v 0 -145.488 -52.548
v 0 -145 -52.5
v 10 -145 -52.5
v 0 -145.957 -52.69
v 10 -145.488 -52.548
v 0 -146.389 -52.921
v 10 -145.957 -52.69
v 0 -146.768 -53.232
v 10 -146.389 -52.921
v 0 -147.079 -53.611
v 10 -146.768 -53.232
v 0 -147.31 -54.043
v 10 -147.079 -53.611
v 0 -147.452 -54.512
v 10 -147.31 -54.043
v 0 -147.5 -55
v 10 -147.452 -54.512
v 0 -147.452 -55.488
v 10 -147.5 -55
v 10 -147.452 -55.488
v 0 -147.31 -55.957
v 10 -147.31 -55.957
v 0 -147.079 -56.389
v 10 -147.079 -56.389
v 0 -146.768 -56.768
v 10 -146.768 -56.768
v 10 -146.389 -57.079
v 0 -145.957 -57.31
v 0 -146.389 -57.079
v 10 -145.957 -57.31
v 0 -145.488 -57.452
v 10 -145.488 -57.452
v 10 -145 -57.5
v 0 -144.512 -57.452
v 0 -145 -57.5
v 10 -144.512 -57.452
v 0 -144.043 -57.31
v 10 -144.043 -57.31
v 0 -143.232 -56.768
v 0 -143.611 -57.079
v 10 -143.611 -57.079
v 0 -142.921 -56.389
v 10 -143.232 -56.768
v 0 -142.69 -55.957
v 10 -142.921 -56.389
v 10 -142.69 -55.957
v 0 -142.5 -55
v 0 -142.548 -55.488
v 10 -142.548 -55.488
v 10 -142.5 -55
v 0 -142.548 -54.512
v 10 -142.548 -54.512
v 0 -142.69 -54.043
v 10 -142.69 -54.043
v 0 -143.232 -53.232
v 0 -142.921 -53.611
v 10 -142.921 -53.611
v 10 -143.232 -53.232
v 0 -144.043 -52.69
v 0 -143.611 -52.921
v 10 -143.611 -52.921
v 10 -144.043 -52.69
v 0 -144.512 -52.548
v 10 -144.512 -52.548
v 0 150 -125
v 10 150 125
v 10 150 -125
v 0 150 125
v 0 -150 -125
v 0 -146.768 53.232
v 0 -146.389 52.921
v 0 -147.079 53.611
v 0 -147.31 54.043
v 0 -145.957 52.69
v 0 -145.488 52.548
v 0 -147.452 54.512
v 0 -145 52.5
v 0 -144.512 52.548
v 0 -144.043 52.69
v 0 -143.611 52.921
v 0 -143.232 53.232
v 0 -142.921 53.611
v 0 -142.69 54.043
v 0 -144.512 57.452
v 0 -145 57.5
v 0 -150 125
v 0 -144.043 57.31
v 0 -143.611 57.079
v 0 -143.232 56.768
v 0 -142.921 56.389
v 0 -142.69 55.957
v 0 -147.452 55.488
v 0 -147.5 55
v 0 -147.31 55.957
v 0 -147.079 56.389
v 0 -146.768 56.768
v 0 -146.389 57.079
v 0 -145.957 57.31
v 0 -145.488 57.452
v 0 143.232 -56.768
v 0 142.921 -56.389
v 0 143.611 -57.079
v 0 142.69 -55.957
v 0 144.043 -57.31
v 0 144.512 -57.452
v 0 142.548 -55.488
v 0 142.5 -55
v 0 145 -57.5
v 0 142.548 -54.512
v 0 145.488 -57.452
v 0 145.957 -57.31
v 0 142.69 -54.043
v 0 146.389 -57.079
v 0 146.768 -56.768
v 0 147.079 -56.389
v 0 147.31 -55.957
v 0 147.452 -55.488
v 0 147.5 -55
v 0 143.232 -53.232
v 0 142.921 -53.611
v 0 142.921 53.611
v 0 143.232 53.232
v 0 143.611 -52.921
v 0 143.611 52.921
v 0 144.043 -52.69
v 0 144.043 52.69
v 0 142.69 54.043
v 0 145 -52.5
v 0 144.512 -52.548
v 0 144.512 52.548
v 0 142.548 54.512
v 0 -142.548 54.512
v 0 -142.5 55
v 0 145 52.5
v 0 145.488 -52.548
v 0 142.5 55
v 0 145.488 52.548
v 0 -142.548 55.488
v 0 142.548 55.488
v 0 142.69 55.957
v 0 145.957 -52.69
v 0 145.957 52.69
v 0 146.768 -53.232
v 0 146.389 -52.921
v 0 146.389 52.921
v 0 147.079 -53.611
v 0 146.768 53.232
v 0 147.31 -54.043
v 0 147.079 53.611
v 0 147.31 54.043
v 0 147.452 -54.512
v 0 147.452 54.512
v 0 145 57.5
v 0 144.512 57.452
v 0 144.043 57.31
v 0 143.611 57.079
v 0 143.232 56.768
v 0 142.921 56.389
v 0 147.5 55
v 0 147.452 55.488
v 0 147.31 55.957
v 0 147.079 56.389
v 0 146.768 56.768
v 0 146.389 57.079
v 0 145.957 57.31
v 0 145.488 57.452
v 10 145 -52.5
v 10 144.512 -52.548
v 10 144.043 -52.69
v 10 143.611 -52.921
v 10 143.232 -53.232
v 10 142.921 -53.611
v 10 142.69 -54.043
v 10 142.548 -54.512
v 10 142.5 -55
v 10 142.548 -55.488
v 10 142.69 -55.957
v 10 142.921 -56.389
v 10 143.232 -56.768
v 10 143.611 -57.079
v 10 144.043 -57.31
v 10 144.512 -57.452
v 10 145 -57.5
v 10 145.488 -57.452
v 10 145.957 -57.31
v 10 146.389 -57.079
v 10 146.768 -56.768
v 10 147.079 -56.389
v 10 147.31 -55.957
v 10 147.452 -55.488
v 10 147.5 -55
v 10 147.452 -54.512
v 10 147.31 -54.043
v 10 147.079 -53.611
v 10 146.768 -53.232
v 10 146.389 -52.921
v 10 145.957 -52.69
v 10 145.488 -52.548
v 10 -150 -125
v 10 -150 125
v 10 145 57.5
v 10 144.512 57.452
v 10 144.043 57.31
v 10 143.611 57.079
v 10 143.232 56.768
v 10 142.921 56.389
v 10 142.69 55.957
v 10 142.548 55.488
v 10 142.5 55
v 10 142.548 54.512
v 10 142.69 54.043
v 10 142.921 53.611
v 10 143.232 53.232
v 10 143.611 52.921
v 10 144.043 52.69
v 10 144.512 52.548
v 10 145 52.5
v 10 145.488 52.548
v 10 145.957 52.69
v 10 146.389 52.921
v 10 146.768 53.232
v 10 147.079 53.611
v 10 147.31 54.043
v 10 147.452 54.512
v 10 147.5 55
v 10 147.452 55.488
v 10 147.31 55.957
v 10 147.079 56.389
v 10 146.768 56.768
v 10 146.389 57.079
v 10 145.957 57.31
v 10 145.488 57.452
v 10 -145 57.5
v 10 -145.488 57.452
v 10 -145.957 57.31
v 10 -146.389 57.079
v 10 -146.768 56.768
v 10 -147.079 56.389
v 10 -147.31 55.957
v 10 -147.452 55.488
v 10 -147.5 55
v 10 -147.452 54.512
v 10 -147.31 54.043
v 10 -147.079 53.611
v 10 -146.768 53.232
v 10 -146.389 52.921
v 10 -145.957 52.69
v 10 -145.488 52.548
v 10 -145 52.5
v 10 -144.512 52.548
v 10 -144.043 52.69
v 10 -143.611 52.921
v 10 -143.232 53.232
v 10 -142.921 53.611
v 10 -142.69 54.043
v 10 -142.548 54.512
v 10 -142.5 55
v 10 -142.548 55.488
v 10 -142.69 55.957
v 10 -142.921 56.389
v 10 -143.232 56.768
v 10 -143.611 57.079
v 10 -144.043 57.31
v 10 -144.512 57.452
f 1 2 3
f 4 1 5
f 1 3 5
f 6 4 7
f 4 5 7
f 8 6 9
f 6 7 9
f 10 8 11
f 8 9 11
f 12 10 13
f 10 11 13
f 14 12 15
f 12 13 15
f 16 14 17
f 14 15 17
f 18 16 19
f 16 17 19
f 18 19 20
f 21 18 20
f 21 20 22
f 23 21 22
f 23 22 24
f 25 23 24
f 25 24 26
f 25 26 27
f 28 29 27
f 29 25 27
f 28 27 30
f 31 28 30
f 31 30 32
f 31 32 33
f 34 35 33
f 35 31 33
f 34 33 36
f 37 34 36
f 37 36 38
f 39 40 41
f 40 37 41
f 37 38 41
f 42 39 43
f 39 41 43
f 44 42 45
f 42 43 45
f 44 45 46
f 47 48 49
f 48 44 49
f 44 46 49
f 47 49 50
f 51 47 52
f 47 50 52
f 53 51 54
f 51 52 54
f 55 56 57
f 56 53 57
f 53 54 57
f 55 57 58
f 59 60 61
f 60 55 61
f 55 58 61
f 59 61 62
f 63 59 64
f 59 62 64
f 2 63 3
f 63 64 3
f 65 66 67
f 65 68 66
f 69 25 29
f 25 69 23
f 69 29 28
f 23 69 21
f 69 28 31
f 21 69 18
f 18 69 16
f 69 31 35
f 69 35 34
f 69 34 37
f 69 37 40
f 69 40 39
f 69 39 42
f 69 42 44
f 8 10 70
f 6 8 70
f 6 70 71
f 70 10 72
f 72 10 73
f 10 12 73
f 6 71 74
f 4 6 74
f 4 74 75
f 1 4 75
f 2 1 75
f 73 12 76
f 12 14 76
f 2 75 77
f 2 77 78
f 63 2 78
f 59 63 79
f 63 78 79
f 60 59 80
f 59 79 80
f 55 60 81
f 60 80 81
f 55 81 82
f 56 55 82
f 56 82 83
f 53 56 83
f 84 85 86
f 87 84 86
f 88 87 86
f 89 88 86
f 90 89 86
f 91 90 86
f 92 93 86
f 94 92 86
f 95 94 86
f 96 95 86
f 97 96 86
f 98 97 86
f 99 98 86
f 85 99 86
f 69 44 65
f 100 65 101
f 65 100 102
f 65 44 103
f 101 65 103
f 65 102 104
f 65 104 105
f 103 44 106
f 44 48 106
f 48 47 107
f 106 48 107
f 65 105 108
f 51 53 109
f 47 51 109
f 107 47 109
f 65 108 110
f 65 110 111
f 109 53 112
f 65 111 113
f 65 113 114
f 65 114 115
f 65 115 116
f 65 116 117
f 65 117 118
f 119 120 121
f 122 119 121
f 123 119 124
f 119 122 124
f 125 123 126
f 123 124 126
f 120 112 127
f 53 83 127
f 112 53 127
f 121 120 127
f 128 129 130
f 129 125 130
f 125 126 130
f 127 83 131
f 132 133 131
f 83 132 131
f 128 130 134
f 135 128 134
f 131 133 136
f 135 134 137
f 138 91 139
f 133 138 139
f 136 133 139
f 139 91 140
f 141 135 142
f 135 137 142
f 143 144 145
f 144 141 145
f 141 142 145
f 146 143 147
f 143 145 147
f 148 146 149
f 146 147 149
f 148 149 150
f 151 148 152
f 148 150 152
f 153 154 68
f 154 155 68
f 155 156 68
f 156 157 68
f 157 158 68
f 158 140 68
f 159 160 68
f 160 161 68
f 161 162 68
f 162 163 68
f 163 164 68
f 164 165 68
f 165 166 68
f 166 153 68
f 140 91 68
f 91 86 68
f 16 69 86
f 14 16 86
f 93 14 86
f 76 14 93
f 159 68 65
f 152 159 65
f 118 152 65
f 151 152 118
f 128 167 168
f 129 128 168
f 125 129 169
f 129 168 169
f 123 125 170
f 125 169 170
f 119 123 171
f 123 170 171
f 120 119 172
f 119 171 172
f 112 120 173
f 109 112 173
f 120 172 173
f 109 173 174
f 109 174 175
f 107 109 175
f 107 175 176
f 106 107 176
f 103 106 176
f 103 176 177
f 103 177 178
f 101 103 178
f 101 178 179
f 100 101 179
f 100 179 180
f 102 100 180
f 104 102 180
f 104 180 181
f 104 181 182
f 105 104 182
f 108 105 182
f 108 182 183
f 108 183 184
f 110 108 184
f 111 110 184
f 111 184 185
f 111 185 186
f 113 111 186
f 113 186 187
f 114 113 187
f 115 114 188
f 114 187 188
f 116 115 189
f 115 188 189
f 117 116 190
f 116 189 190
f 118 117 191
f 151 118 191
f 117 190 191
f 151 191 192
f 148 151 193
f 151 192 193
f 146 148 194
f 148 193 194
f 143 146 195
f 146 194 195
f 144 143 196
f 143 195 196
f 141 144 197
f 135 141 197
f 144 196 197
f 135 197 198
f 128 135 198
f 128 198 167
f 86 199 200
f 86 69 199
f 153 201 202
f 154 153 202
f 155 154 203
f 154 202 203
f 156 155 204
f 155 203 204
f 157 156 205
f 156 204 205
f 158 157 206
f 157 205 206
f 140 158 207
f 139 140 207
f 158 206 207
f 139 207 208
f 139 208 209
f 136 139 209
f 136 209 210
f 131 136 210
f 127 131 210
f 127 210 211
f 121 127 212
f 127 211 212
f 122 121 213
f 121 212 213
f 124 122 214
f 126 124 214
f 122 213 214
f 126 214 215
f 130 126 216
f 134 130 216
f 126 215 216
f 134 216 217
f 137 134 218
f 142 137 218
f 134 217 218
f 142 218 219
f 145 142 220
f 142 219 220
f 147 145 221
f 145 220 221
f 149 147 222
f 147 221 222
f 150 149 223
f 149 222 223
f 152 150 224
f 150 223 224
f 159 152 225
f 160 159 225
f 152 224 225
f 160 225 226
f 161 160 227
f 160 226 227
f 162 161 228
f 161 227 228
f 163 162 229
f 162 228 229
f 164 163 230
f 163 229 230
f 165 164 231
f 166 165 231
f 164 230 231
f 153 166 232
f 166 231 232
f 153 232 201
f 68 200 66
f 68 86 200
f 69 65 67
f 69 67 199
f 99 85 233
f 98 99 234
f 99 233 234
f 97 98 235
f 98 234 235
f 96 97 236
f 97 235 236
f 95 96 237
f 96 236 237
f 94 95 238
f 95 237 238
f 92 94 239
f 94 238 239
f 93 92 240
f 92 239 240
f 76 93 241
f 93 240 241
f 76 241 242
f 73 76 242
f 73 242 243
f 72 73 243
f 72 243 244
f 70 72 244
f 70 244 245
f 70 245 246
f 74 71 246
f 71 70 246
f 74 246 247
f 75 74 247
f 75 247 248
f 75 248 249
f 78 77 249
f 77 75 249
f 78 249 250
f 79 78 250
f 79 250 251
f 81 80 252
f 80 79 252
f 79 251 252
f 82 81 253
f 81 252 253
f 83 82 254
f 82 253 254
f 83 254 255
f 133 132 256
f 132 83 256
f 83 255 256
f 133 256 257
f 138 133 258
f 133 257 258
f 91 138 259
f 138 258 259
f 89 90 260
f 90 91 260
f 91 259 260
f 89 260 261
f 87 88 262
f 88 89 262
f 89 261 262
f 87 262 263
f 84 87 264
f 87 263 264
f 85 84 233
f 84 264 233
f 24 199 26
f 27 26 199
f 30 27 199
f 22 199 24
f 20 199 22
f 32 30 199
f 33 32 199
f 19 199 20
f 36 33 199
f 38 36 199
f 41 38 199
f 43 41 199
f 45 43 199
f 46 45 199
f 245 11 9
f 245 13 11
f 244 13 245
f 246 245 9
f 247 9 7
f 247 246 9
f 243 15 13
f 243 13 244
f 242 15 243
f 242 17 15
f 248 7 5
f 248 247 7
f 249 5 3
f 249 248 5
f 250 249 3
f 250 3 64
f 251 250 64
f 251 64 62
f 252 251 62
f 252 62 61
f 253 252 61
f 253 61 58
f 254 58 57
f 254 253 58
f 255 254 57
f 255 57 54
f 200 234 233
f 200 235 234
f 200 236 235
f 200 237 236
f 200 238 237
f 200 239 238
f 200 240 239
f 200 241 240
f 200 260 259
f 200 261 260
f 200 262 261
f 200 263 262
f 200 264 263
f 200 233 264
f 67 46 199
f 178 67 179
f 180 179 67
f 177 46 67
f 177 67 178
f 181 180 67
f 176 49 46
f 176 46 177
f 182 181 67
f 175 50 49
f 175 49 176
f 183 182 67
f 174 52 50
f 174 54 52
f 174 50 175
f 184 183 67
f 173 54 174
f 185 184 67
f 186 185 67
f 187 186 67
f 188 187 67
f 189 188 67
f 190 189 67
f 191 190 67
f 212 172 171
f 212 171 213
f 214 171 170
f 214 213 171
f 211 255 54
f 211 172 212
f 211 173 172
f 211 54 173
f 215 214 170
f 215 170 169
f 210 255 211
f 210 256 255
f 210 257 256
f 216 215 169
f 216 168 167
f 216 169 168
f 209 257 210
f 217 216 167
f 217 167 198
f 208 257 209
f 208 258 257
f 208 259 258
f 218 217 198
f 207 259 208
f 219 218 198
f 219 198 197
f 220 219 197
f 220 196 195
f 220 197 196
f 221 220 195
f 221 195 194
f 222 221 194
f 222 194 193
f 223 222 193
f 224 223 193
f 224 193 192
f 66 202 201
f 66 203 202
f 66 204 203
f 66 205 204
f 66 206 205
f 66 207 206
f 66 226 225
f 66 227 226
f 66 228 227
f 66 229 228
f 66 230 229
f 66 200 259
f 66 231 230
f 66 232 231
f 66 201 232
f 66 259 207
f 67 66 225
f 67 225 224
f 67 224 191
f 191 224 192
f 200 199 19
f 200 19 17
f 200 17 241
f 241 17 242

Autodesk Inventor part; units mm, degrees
ref_plane "YZ Plane" through (0, 0, 0) normal (1, 0, 0) x (0, 1, 0)
ref_plane "XZ Plane" through (0, 0, 0) normal (0, 1, 0) x (-1, 0, 0)
ref_plane "XY Plane" through (0, 0, 0) normal (0, 0, 1) x (1, 0, 0)
sketch "Sketch1" plane through (0, 0, 0) normal (1, 0, 0) x (0, 1, 0)
  line L0 (-150, 125) -> (150, 125)
  line L1 (150, 125) -> (150, -125)
  line L2 (150, -125) -> (-150, -125)
  line L3 (-150, -125) -> (-150, 125)
  line L4 (-150, 125) -> (150, -125) construction
  line L5 (150, 125) -> (-150, -125) construction
  point P0 (0, 0)
  dimension "d0" = 250
  dimension "d1" = 300
extrude "Extrusion1" add sketch "Sketch1" along normal blind 10
sketch "Sketch2" plane through (0, 0, 0) normal (-1, 0, 0) x (0, 0, 1)
  line L0 (-125, -150) -> (-125, 150) projected
  line L1 (125, -150) -> (-125, -150) projected
  line L2 (125, 150) -> (125, -150) projected
  line L3 (-125, 150) -> (125, 150) projected
  line L4 (120, -145) -> (-120, -145)
  line L5 (-120, -145) -> (-120, 145)
  line L6 (-120, 145) -> (120, 145)
  line L7 (120, 145) -> (120, -145)
  line L8 (0, -210) -> (0, 210) construction
  line L9 (-175, 0) -> (175, 0) construction
  point P0 (0, 0)
  point P1 (0, 145)
  point P2 (55, 145)
  point P3 (0, -145)
  point P4 (-55, 145)
  dimension "d4" = 5
  dimension "d7" = 70
  dimension "d8" = 70
hole "Hole1" at (0, 145, 55) at (0, 145, -55) direction (1, 0, 0) diameter 5 end through all
mirror "Mirror1" about plane through (0, 0, 0) normal (0, 1, 0) of "Hole1"
properties part number "10_Tam_go_mat_top"
